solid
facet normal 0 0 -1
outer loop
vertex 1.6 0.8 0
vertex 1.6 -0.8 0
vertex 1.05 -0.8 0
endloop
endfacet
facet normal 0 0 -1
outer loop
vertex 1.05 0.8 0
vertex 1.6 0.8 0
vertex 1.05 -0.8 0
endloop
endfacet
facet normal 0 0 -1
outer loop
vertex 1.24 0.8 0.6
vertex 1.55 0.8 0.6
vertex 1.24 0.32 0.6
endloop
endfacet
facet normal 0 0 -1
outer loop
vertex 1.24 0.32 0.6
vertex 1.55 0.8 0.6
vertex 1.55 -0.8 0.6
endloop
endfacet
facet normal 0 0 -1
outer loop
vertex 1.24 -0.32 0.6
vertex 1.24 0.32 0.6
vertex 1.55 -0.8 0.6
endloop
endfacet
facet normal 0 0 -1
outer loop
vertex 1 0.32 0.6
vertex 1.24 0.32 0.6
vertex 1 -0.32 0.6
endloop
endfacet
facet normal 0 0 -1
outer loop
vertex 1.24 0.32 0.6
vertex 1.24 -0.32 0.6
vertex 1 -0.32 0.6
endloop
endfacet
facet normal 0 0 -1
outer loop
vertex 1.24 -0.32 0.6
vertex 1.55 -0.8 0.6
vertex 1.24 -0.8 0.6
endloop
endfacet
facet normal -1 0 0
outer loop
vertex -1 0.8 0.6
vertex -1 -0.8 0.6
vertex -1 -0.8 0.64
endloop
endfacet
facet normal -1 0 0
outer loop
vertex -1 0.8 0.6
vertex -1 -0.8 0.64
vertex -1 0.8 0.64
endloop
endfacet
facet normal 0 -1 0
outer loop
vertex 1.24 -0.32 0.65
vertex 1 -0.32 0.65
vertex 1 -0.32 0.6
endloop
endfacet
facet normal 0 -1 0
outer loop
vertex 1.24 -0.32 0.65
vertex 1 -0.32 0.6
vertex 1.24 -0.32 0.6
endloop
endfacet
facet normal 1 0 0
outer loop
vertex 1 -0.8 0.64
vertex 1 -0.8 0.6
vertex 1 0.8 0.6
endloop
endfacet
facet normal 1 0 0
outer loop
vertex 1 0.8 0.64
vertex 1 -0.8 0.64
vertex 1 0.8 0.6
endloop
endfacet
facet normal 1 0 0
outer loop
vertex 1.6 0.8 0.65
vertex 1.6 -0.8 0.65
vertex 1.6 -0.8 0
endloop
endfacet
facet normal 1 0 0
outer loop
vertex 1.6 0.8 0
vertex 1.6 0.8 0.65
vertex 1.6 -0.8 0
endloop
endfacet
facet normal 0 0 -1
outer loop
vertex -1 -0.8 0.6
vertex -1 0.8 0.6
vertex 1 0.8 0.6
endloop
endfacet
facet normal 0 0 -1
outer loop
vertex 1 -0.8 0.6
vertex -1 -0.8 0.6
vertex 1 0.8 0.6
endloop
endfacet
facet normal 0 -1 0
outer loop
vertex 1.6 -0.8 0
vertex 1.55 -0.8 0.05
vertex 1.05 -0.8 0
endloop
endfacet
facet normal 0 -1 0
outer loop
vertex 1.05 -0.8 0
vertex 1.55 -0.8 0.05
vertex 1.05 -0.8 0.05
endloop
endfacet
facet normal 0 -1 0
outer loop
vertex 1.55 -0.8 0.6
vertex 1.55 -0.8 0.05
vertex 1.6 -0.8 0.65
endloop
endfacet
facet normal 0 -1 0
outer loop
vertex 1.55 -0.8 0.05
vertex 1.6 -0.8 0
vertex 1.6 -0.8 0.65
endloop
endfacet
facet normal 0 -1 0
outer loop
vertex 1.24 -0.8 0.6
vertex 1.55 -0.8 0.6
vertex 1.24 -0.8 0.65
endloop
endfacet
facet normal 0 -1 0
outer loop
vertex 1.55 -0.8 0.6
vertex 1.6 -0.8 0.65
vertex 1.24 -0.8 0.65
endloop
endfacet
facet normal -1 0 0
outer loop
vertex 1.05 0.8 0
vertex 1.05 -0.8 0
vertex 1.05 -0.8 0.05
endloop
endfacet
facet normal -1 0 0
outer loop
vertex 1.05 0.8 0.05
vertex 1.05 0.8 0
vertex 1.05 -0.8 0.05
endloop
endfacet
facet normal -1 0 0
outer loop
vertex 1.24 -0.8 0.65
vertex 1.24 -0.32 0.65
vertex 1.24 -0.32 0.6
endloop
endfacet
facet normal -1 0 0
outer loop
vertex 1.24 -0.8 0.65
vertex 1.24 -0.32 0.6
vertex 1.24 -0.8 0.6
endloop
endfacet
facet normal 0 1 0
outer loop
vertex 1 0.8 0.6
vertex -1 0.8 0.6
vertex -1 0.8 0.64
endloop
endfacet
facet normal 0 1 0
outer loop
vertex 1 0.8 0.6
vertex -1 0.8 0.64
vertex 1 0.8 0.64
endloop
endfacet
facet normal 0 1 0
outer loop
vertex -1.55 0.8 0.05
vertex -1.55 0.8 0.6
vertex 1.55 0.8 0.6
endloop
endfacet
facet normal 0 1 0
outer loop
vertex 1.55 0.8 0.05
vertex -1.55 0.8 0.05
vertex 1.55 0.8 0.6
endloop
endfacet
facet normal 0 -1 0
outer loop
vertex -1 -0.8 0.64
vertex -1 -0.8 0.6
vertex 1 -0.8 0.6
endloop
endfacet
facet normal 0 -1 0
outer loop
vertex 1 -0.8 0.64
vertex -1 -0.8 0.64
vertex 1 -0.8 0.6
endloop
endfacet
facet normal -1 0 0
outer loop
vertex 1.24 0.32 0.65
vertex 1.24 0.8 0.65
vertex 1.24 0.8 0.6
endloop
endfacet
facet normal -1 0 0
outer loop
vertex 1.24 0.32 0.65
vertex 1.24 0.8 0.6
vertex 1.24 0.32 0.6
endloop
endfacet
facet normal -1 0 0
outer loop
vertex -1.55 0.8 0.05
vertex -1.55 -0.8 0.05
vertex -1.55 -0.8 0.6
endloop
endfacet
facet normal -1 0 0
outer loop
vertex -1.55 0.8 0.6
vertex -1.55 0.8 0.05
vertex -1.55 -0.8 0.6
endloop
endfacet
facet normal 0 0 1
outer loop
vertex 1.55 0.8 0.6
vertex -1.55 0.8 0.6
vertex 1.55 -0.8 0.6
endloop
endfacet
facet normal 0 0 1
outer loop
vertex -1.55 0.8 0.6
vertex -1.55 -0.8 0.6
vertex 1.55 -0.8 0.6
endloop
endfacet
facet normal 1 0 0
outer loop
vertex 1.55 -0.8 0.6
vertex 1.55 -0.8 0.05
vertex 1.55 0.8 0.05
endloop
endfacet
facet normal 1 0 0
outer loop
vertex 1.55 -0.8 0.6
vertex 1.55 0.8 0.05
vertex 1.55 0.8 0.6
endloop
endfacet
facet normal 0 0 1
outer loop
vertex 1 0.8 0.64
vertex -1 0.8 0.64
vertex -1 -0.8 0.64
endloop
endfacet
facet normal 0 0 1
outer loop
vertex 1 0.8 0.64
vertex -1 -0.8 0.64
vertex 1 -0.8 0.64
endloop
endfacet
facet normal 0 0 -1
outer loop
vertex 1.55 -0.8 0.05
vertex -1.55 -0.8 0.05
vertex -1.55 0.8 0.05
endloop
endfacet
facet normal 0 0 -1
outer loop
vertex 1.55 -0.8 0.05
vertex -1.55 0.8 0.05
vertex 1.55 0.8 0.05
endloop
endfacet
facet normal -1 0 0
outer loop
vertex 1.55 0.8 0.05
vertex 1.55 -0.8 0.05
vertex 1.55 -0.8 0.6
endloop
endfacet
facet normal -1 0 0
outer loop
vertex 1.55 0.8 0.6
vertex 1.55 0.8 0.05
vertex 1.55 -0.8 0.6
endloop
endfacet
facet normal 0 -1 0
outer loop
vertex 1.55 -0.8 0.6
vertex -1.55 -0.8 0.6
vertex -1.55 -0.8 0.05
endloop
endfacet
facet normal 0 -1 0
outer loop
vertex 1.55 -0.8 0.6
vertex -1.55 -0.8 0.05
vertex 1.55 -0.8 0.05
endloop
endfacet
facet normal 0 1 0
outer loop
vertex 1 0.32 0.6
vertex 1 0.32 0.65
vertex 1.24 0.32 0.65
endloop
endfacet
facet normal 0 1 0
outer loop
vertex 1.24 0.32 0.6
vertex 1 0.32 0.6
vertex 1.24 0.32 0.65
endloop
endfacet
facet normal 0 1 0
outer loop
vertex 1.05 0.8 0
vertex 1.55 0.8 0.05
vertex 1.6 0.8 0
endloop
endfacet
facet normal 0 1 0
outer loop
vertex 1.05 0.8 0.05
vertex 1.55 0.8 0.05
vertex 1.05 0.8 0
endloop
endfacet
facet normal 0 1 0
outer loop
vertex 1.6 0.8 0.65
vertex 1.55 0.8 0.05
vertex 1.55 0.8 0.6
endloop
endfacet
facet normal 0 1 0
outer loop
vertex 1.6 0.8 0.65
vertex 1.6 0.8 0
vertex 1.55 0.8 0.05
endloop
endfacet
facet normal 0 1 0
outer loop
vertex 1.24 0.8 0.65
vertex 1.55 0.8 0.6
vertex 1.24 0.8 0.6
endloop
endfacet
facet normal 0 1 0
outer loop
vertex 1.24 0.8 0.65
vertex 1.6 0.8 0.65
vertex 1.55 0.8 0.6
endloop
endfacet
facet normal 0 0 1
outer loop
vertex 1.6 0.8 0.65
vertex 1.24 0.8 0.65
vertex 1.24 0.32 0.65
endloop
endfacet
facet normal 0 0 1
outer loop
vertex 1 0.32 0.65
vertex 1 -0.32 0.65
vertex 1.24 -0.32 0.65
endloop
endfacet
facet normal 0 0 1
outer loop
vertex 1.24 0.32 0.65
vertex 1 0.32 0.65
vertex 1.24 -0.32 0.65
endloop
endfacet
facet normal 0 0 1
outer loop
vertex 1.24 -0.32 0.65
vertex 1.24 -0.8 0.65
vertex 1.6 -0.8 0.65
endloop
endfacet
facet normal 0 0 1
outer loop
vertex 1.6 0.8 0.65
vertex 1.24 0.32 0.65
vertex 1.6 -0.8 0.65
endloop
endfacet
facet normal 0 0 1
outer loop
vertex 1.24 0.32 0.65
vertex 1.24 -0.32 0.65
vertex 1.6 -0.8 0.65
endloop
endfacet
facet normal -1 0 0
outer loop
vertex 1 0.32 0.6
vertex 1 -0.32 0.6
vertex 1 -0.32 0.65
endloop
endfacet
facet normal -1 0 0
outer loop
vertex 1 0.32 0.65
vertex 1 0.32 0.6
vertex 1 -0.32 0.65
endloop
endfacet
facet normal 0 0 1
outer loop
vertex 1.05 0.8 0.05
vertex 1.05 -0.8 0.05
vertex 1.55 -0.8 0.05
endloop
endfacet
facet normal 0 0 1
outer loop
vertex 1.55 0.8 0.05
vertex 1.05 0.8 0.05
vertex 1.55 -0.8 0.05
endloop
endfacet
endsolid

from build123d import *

# Parameters (mm, degrees)
PAD_DEPTH    = 0.8
SKETCH001_W  = 0.24
SKETCH001_H  = 0.48
POCKET_DEPTH = 0.05
SKETCH002_W  = 3.1
SKETCH002_H  = 0.55
PAD001_DEPTH = 0.8
SKETCH003_W  = 2
SKETCH003_H  = 1.6
PAD002_DEPTH = 0.04


with BuildPart() as connection:
    # Sketch → Pad (new body, symmetric)
    with BuildSketch(Plane.XZ):
        Polygon((-1, 0.65), (-1.6, 0.65), (-1.6, 0), (-1.05, 0), (-1.05, 0.05), (-1.55, 0.05), (-1.55, 0.6), (-1, 0.6), align=None)
    extrude(amount=PAD_DEPTH, both=True)

    # Sketch001 (on Face1 of Pad) → Pocket (cut)
    with BuildSketch(Plane(origin=(0, 0, 0.65), x_dir=(-1, 0, 0), z_dir=(0, 0, 1))):
        with Locations((1.12, -0.56)):
            Rectangle(SKETCH001_W, SKETCH001_H)
        with Locations((1.12, 0.56)):
            Rectangle(SKETCH001_W, SKETCH001_H)
    extrude(amount=-POCKET_DEPTH, mode=Mode.SUBTRACT)


with BuildPart() as connection_mirrored:
    # mirror: instance of Connection
    add(connection.part.mirror(Plane(origin=(0, 0, 0), x_dir=(0, -1, 0), z_dir=(1, 0, 0))))


with BuildPart() as substrate:
    # Sketch002 → Pad001 (new body, symmetric)
    with BuildSketch(Plane.XZ):
        with Locations((0, 0.325)):
            Rectangle(SKETCH002_W, SKETCH002_H)
    extrude(amount=PAD001_DEPTH, both=True)


with BuildPart() as overcoat:
    # Sketch003 (on DatumPlane) → Pad002 (new body)
    with BuildSketch(Plane(origin=(-0.333333, 0.106667, 0.6), x_dir=(1, 0, 0), z_dir=(0, 0, 1))):
        with Locations((0.333333, -0.106667)):
            Rectangle(SKETCH003_W, SKETCH003_H)
    extrude(amount=PAD002_DEPTH)


solid = Compound([connection_mirrored.part, substrate.part, overcoat.part])
